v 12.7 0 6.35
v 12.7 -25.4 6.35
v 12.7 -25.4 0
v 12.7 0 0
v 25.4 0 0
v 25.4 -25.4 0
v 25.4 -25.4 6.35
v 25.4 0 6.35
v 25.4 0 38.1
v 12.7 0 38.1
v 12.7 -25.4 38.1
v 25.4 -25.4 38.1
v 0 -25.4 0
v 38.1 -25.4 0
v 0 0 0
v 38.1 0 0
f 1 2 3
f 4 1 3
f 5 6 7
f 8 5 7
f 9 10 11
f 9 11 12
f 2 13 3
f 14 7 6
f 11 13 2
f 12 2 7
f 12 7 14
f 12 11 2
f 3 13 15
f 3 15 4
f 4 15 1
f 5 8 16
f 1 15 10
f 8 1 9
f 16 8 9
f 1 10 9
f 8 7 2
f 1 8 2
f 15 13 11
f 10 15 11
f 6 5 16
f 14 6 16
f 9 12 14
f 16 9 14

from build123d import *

# Parameters (mm, degrees)
F0_W     = 38.1
F0_H     = 38.1
F1_DEPTH = 25.4
F3_DEPTH = 25.4
F5_DEPTH = 25.4


with BuildPart() as f1:
    # F0 (on Front) → F1 (new body)
    with BuildSketch(Plane.XZ):
        with Locations((19.05, 19.05)):
            Rectangle(F0_W, F0_H)
    extrude(amount=F1_DEPTH)

    # F2 (on face) → F3 (cut)
    with BuildSketch(Plane.XZ.offset(25.4)):
        Polygon((0, 0), (12.7, 38.1), (0, 38.1), align=None)
        Polygon((38.1, 38.1), (25.4, 38.1), (38.1, 0), align=None)
    extrude(amount=-F3_DEPTH, mode=Mode.SUBTRACT)

    # F4 (on face) → F5 (cut)
    with BuildSketch(Plane.XZ.offset(25.4)):
        Polygon((12.7, 0), (19.05, 0), (25.4, 0), (25.4, 6.35), (12.7, 6.35), align=None)
    extrude(amount=-F5_DEPTH, mode=Mode.SUBTRACT)


solid = f1.part
